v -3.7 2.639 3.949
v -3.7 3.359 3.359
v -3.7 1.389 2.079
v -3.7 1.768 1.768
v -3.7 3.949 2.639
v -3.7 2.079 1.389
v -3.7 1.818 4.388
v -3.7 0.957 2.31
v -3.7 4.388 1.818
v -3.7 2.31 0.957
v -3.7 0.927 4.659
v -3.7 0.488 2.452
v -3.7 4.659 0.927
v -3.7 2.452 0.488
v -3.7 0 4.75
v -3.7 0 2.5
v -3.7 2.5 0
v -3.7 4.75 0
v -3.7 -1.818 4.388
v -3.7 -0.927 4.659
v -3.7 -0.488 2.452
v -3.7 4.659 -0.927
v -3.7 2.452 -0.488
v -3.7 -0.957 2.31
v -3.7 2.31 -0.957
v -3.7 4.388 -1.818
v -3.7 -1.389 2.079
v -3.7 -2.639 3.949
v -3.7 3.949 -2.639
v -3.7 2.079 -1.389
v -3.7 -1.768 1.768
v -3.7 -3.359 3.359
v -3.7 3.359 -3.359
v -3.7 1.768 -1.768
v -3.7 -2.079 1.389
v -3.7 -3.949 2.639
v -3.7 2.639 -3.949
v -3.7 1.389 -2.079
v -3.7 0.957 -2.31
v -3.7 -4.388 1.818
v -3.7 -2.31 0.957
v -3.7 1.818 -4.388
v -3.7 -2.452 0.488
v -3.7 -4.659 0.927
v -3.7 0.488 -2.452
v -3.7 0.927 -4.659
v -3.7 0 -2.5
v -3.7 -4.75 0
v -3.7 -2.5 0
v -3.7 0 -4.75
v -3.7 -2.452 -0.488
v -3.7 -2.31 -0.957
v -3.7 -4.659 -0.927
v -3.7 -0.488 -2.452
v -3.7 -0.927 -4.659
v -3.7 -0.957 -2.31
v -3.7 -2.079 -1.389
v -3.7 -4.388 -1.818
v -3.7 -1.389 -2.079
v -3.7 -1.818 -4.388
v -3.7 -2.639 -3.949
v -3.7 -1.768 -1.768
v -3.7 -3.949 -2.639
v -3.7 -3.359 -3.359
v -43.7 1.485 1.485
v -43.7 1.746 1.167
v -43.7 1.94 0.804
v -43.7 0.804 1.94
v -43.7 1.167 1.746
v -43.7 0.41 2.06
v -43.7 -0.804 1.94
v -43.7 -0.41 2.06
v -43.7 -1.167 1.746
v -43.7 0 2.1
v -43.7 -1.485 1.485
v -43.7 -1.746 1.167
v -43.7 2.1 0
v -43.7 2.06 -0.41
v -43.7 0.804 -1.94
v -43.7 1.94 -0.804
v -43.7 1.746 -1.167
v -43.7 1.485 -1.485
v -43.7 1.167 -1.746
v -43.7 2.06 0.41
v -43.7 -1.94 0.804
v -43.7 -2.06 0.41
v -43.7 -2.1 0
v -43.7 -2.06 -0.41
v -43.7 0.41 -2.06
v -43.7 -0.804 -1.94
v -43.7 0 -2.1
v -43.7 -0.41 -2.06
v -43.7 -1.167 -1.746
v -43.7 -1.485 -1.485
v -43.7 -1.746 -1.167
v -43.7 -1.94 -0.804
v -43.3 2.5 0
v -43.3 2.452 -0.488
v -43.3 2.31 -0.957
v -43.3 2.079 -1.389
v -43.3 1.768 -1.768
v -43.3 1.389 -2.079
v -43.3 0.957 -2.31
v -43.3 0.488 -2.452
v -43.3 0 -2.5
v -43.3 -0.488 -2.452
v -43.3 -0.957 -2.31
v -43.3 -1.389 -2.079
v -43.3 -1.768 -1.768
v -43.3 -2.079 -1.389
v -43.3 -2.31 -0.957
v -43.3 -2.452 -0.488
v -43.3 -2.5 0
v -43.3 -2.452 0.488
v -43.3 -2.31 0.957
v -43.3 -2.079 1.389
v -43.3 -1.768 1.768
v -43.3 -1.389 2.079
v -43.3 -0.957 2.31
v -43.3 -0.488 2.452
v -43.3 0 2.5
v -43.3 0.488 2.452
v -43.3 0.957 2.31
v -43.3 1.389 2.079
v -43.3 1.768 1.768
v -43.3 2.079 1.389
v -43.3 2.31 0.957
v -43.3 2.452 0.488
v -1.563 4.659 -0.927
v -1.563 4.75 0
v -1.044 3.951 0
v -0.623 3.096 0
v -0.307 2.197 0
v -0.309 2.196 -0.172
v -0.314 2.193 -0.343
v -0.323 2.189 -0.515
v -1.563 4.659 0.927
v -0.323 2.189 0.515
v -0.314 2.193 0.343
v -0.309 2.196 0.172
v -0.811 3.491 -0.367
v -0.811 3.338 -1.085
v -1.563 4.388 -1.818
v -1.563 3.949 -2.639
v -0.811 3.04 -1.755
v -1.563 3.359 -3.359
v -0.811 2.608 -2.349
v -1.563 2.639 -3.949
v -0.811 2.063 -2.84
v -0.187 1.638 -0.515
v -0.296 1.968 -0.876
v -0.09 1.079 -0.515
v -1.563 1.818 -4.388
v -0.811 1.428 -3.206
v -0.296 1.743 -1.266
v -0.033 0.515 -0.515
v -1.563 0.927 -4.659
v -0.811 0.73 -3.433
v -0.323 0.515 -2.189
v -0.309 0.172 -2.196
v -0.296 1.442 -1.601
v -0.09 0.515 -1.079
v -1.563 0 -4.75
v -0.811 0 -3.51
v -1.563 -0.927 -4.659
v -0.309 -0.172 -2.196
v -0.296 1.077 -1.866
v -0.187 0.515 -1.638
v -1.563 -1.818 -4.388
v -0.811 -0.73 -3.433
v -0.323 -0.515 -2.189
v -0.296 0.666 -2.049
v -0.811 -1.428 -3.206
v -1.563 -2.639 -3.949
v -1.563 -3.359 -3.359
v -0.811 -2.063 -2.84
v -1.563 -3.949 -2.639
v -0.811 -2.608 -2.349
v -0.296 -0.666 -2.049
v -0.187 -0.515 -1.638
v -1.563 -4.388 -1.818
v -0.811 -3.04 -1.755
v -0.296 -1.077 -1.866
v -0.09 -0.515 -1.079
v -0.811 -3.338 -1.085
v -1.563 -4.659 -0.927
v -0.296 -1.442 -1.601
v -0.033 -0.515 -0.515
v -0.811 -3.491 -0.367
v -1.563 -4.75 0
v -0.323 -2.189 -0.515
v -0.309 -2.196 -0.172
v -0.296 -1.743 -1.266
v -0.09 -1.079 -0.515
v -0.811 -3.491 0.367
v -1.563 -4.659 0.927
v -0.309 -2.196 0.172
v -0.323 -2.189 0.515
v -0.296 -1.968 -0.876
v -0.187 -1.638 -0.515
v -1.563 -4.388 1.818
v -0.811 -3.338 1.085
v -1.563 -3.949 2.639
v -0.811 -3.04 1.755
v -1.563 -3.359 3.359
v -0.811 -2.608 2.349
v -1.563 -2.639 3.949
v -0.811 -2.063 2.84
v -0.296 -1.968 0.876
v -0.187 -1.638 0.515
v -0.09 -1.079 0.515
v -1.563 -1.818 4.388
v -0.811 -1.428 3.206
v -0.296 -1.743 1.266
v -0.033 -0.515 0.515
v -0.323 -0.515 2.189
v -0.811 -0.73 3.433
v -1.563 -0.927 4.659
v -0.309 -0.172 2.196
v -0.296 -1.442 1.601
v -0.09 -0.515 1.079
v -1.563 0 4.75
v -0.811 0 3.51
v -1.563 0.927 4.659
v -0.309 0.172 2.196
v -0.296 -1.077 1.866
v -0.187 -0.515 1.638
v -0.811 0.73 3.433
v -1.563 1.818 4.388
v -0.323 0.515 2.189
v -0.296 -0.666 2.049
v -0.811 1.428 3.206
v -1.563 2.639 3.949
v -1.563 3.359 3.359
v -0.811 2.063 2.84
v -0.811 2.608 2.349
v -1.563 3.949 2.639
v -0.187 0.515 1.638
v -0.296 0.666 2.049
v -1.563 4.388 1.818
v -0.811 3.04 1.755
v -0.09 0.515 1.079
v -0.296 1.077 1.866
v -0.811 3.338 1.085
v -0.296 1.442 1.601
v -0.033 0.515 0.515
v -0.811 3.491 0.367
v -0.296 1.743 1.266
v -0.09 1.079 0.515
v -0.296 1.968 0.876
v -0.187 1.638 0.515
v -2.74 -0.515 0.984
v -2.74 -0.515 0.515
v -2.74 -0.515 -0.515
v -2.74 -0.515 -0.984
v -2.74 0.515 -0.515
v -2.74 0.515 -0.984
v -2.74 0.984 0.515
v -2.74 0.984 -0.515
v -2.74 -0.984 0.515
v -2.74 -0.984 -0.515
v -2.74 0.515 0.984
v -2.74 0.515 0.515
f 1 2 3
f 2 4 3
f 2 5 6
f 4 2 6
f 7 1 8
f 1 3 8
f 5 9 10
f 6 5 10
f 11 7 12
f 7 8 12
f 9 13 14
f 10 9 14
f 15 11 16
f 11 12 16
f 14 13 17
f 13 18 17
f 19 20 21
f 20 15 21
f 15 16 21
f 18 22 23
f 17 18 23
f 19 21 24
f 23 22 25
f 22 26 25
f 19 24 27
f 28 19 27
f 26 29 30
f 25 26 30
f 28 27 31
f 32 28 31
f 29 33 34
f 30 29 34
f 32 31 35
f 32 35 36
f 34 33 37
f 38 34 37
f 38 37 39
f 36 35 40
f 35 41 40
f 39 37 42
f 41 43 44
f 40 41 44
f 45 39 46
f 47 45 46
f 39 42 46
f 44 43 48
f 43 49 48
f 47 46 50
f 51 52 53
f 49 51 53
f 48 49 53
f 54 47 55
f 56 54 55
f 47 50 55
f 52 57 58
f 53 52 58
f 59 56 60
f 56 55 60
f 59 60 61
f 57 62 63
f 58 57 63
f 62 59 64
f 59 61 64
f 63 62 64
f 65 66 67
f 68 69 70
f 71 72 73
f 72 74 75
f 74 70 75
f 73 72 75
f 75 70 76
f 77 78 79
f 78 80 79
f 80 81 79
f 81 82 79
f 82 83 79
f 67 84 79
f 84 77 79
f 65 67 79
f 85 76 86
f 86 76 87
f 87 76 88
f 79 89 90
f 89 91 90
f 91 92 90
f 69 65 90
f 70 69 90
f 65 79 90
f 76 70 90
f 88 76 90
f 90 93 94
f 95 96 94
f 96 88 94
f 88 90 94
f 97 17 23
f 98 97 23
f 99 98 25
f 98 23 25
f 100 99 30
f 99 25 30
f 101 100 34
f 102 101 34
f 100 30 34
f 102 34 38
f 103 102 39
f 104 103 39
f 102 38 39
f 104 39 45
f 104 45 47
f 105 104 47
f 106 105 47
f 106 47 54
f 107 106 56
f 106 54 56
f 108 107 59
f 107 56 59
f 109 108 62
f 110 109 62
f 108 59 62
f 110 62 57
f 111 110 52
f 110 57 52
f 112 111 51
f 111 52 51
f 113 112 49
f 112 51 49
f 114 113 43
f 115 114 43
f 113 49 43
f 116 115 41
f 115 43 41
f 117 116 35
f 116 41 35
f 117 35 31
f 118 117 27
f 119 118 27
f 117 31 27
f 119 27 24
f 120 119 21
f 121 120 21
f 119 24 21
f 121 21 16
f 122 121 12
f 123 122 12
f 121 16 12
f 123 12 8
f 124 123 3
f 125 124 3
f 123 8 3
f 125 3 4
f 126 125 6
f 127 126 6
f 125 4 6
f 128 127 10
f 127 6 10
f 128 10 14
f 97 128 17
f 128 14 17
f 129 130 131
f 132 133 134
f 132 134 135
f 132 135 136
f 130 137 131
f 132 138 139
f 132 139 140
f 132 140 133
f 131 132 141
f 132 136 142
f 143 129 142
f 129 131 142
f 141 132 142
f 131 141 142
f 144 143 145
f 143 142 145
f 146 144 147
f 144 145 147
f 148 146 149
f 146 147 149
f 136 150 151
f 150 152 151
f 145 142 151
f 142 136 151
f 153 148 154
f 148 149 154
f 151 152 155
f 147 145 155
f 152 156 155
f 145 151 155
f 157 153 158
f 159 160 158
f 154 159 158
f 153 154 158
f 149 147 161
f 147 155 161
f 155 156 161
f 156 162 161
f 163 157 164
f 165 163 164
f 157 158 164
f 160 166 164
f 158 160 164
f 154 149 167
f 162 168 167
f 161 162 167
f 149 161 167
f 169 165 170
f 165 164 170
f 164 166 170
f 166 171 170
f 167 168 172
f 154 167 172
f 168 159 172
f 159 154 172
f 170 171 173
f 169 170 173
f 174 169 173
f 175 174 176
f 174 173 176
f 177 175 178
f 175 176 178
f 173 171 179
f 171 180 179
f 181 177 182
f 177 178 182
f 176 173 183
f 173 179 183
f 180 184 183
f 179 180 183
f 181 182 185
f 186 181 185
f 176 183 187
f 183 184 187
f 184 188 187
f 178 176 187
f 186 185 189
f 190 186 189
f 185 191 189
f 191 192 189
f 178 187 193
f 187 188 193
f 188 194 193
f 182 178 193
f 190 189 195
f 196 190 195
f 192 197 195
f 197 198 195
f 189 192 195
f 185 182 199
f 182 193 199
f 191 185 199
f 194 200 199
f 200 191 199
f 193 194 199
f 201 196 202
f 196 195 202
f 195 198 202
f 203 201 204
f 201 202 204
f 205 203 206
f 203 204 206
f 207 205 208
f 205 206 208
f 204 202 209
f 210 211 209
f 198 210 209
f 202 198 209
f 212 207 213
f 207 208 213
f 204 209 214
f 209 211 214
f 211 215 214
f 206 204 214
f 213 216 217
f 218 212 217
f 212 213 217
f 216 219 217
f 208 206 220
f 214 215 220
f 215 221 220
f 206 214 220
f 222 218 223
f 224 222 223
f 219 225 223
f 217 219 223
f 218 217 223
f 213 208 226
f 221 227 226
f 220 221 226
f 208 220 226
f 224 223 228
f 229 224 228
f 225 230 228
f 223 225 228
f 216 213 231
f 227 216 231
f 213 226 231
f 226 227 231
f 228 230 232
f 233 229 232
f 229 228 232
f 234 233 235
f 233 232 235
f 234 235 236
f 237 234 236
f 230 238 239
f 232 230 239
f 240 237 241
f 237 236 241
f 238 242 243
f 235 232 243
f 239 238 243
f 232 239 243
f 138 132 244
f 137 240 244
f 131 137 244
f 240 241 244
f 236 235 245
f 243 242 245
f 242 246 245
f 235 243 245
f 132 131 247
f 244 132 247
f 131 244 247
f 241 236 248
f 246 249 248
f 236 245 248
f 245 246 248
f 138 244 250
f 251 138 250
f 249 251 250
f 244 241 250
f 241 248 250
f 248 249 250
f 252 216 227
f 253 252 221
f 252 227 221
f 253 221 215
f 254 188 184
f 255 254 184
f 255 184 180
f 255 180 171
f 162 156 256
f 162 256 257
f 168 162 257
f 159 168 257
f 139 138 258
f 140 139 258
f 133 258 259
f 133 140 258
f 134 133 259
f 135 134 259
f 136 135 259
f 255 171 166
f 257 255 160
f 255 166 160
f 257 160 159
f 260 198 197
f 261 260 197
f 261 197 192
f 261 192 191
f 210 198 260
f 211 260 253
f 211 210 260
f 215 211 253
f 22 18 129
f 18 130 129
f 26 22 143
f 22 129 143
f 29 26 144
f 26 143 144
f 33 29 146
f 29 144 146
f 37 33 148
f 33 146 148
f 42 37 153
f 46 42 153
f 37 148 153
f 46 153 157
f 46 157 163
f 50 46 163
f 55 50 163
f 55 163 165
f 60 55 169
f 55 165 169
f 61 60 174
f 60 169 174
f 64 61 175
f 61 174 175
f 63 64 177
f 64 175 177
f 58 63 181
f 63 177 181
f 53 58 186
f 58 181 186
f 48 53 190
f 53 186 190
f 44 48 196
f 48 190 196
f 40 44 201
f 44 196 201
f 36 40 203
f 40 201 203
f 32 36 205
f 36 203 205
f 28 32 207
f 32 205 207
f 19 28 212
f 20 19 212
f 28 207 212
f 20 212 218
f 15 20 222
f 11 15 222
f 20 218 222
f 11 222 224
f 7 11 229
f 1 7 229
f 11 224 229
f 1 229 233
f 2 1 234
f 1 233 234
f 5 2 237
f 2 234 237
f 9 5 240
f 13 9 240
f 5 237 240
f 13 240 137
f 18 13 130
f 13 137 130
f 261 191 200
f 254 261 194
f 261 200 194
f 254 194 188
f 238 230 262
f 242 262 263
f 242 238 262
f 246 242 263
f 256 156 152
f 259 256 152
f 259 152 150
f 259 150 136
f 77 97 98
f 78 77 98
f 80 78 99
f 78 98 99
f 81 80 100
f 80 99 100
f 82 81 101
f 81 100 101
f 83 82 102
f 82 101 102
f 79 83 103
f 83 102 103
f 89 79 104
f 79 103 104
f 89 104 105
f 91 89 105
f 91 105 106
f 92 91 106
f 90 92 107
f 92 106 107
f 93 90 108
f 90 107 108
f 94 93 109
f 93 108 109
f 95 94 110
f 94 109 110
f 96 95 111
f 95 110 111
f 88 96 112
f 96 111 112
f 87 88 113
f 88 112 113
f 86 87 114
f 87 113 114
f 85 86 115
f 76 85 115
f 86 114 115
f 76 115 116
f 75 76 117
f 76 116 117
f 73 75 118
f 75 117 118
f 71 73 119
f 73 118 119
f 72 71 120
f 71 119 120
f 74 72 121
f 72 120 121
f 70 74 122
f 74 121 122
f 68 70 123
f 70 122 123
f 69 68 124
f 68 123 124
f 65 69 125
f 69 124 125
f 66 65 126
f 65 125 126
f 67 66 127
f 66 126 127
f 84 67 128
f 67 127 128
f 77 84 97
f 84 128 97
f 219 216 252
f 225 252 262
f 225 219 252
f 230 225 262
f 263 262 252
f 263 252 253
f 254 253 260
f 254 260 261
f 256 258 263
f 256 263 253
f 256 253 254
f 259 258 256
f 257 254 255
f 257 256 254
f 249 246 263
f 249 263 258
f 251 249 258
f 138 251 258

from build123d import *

# Parameters (mm, degrees)
SKETCH2_W          = 1.835
SKETCH2_H          = 1.03
SKETCH2_W_2        = 1.03
SKETCH2_H_2        = 1.835
CUT_EXTRUDE1_DEPTH = 2.74
CHAMFER1_SIZE      = 0.4
DRAFT1_ANGLE       = 26.5


with BuildPart() as part:
    # Sketch1 → Revolve1 (revolve)
    with BuildSketch(Plane.XY):
        with BuildLine():
            Line((-43.7, 0), (-43.7, 2.5))
            Line((-43.7, 2.5), (-3.7, 2.5))
            Line((-3.7, 2.5), (-3.7, 4.75))
            Line((-3.7, 4.75), (-1.562803405, 4.75))
            ThreePointArc((-1.562803405, 4.75), (-0.400737774, 2.500242712), (0, 0))
            Line((0, 0), (-43.7, 0))
        make_face()
    revolve(axis=Axis((0, 0, 0), (-1, 0, 0)))

    # Sketch2 → Cut-Extrude1 (cut)
    with BuildSketch(Plane(origin=(0, 0, 0), x_dir=(0, 0, -1), z_dir=(1, 0, 0))):
        with Locations((-1.4325, 0)):
            Rectangle(SKETCH2_W, SKETCH2_H)
        with Locations((0, 1.4325)):
            Rectangle(SKETCH2_W_2, SKETCH2_H_2)
        Rectangle(SKETCH2_W_2, SKETCH2_H)
        with Locations((0, -1.4325)):
            Rectangle(SKETCH2_W_2, SKETCH2_H_2)
        with Locations((1.4325, 0)):
            Rectangle(SKETCH2_W, SKETCH2_H)
    extrude(amount=-CUT_EXTRUDE1_DEPTH, mode=Mode.SUBTRACT)

    # Chamfer1
    chamfer1_edges = [part.edges().sort_by_distance(p)[0] for p in [
        (-43.7, -2.5, 0),
    ]]
    chamfer(chamfer1_edges, length=CHAMFER1_SIZE)

    # Draft1
    draft1_faces = [part.faces().sort_by_distance(p)[0] for p in [
        (-1.549357489, 0, -2.35),
        (-1.549357489, -2.35, 0),
        (-1.549357489, 2.35, 0),
        (-1.549357489, 0, 2.35),
    ]]
    draft(draft1_faces, Plane(origin=(0, 0, 0), x_dir=(0, 0, 1), z_dir=(1, 0, 0)), DRAFT1_ANGLE)


solid = part.part
